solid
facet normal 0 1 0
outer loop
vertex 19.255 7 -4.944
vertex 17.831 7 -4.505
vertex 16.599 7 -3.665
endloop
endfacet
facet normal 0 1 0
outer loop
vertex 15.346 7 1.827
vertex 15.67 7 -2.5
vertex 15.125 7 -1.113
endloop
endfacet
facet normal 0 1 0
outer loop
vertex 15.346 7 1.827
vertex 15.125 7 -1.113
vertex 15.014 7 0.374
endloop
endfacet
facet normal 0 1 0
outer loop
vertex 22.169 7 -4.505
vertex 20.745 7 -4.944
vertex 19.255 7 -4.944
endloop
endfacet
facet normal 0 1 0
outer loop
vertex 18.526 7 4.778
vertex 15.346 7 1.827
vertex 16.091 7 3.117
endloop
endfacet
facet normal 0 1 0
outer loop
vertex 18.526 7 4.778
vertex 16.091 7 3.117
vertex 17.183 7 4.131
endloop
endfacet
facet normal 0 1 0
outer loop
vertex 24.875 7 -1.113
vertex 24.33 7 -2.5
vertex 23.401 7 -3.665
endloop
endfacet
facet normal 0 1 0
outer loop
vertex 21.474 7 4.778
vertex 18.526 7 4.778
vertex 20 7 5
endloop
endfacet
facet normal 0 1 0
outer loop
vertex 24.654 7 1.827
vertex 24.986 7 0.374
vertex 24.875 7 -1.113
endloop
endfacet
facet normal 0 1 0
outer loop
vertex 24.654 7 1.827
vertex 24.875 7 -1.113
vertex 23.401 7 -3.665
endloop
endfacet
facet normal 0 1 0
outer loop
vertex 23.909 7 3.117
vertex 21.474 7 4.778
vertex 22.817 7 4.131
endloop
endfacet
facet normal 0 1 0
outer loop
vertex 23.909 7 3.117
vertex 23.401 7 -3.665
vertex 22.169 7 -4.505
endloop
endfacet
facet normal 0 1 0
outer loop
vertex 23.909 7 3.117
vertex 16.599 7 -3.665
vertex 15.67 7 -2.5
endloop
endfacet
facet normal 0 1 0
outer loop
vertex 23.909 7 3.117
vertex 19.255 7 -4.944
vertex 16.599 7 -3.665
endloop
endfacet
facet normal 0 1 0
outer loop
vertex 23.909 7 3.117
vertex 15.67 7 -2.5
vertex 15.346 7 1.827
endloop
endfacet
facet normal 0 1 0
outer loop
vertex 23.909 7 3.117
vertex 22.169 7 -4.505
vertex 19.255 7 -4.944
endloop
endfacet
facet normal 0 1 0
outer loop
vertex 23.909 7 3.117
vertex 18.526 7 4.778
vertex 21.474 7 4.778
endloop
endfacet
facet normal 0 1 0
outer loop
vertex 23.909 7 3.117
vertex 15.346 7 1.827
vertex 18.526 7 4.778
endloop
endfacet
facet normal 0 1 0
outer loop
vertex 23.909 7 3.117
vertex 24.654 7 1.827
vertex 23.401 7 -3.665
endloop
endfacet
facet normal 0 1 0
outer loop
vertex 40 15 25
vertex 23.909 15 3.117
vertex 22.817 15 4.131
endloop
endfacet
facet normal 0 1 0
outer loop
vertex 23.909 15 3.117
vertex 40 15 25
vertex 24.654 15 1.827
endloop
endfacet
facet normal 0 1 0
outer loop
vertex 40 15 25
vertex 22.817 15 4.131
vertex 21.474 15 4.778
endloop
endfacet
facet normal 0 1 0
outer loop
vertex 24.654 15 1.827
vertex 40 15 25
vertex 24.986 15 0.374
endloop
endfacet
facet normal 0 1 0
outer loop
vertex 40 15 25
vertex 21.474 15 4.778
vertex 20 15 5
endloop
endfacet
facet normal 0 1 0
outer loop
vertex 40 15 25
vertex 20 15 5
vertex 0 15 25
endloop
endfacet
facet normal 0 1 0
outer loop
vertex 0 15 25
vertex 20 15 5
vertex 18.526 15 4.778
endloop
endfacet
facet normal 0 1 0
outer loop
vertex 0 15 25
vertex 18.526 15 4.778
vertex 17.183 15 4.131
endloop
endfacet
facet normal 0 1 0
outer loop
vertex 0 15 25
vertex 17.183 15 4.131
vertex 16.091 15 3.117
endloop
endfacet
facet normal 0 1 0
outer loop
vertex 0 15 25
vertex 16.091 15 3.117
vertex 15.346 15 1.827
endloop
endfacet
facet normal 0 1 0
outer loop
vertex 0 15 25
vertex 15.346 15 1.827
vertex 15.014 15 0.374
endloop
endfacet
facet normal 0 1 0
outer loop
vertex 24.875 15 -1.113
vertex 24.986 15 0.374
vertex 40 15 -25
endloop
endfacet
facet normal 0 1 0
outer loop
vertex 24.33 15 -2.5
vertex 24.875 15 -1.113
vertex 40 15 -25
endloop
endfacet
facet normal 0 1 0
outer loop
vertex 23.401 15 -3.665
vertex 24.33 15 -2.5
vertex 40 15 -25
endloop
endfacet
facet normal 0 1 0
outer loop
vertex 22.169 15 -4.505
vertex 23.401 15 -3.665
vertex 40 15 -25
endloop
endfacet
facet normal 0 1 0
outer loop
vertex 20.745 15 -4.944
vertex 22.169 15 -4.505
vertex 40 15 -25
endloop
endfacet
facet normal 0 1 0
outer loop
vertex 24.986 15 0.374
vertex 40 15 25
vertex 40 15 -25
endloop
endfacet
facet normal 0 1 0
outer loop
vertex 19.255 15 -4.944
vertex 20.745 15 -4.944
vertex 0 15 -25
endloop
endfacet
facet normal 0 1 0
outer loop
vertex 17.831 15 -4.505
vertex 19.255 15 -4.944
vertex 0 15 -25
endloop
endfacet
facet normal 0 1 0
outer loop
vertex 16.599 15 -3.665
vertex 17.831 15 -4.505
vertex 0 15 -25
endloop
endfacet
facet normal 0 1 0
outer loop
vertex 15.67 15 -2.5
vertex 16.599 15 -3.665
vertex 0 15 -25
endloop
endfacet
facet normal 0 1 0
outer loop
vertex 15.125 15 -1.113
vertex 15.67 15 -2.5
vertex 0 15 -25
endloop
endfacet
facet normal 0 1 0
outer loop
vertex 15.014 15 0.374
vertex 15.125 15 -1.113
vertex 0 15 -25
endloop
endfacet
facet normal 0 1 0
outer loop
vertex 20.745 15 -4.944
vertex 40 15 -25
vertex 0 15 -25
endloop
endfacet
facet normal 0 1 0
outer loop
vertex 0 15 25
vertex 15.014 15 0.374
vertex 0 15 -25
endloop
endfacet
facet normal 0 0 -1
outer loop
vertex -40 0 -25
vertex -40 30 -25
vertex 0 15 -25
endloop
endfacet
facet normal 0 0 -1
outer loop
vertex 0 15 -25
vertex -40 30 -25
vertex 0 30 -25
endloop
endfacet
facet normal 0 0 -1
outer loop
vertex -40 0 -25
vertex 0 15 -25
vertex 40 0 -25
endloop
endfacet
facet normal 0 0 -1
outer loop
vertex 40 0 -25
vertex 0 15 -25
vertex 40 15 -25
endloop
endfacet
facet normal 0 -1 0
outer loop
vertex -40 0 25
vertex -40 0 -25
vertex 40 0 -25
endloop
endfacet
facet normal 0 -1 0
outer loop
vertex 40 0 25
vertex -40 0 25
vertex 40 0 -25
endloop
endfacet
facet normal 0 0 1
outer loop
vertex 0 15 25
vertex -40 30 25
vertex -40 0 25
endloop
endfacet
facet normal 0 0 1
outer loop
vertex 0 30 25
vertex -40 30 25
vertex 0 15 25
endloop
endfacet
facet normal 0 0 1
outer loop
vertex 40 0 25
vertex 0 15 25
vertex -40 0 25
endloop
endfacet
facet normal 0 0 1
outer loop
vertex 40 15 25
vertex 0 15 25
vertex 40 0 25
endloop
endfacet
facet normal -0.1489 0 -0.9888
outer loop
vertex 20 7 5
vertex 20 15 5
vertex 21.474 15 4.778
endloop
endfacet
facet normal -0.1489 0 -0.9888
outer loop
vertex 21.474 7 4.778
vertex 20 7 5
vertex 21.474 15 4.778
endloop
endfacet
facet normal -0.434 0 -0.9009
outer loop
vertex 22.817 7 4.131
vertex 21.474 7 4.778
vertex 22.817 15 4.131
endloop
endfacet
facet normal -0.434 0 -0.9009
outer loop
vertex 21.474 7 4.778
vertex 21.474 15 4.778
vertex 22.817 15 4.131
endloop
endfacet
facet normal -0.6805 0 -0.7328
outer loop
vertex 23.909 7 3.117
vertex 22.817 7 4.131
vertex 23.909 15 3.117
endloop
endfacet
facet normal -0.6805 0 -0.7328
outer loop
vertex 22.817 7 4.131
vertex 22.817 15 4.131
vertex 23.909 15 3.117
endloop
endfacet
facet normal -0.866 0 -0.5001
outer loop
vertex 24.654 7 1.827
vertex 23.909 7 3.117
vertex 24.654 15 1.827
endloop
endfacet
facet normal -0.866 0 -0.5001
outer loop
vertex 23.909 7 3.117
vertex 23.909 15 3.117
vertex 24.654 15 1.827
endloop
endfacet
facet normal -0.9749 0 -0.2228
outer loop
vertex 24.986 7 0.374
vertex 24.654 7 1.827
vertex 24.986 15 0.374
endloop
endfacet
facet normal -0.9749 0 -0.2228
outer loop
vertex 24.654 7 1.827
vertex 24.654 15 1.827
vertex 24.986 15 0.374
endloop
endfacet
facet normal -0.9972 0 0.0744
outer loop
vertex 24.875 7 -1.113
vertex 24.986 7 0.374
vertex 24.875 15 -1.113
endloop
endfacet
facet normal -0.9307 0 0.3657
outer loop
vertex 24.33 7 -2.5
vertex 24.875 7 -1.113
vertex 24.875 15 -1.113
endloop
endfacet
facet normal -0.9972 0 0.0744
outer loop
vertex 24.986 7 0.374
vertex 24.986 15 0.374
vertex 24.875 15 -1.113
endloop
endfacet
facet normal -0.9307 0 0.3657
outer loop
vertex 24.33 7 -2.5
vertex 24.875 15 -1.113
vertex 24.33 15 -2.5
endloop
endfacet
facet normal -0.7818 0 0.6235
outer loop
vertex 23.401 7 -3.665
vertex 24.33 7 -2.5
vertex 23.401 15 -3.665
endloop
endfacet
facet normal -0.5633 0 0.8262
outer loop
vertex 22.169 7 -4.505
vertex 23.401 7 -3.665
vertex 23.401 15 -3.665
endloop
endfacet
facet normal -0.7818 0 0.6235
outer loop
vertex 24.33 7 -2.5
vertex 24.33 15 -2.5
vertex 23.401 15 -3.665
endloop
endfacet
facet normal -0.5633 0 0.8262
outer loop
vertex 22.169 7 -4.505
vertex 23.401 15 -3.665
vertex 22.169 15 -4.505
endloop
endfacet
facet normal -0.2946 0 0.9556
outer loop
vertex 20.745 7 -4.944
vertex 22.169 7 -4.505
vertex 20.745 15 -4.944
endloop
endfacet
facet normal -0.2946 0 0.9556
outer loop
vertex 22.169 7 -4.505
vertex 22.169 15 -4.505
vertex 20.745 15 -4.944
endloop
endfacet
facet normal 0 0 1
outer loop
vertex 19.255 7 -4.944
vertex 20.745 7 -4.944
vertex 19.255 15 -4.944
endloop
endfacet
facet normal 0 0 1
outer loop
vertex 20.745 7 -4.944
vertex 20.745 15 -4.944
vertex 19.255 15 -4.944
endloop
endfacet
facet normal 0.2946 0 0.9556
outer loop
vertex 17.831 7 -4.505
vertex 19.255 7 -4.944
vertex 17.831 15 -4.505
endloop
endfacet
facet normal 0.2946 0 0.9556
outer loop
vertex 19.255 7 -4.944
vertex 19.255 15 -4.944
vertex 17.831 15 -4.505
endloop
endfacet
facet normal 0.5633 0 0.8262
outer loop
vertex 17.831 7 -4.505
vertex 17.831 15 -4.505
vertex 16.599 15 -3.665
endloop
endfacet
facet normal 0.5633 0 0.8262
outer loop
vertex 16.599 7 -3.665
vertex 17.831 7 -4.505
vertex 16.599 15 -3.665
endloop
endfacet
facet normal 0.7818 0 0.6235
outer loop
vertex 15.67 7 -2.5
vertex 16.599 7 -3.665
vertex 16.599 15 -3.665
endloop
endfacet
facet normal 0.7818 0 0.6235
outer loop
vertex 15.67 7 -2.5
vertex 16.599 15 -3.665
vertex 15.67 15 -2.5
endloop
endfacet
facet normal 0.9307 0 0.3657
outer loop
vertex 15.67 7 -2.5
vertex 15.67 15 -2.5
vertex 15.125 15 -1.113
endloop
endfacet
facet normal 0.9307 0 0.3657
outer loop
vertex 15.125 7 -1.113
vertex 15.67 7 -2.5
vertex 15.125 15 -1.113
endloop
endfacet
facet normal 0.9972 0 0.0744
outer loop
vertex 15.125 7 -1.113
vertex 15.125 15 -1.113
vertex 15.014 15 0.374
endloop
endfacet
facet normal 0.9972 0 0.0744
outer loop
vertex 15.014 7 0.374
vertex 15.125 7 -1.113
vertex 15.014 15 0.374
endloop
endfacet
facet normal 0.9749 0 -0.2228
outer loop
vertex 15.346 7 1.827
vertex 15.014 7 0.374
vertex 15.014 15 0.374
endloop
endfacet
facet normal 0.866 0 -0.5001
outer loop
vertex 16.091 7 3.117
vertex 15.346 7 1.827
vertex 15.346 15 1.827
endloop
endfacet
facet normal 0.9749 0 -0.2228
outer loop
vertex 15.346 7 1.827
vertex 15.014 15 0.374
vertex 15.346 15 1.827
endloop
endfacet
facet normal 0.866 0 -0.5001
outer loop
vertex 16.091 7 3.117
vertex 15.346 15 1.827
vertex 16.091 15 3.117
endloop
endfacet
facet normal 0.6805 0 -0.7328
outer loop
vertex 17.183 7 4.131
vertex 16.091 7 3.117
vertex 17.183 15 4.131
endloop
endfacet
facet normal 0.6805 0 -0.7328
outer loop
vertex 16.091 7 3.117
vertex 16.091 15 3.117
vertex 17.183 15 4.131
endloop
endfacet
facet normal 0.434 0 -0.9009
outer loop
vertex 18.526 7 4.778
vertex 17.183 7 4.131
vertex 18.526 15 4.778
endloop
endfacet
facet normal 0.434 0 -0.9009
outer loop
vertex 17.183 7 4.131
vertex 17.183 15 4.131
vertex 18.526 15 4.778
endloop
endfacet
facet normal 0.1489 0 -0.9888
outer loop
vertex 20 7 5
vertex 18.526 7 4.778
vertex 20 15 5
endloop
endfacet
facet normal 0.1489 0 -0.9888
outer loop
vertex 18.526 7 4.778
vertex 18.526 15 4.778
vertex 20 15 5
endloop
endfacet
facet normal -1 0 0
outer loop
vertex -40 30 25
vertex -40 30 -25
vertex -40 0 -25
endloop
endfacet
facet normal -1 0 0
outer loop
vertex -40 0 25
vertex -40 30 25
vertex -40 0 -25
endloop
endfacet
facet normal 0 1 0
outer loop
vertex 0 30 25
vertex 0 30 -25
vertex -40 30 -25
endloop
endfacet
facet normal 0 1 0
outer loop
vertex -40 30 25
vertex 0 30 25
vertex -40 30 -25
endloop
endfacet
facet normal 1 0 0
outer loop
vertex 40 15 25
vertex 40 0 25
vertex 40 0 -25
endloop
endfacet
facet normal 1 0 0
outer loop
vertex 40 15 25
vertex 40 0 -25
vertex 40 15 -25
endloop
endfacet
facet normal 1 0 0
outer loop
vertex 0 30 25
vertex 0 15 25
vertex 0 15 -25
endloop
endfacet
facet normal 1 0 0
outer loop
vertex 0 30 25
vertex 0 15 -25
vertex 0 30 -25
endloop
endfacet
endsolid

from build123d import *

# Parameters (mm, degrees)
EXTRUDE_START       = -25
EXTRUDE_1_DEPTH     = 50
SKETCH_2_R          = 5
CUT_EXTRUDE_1_DEPTH = 8


# Read off the part's stored shape, not the designer's step: 凸台-拉伸1
with BuildPart() as part:
    # 凸台-拉伸1 outline → 凸台-拉伸1 (new body)
    with BuildSketch(Plane.XY.offset(EXTRUDE_START)):
        Polygon((-40, 30), (-40, 0), (40, 0), (40, 15), (0, 15), (0, 30), align=None)
    extrude(amount=EXTRUDE_1_DEPTH)

    # 草图2 → 切除-拉伸1 (cut)
    with BuildSketch(Plane(origin=(0, 15, 0), x_dir=(1, 0, 0), z_dir=(0, 1, 0))):
        with Locations(Location((20, 0, 0), (0, 0, 270))):
            Circle(SKETCH_2_R)
    extrude(amount=-CUT_EXTRUDE_1_DEPTH, mode=Mode.SUBTRACT)


solid = part.part
